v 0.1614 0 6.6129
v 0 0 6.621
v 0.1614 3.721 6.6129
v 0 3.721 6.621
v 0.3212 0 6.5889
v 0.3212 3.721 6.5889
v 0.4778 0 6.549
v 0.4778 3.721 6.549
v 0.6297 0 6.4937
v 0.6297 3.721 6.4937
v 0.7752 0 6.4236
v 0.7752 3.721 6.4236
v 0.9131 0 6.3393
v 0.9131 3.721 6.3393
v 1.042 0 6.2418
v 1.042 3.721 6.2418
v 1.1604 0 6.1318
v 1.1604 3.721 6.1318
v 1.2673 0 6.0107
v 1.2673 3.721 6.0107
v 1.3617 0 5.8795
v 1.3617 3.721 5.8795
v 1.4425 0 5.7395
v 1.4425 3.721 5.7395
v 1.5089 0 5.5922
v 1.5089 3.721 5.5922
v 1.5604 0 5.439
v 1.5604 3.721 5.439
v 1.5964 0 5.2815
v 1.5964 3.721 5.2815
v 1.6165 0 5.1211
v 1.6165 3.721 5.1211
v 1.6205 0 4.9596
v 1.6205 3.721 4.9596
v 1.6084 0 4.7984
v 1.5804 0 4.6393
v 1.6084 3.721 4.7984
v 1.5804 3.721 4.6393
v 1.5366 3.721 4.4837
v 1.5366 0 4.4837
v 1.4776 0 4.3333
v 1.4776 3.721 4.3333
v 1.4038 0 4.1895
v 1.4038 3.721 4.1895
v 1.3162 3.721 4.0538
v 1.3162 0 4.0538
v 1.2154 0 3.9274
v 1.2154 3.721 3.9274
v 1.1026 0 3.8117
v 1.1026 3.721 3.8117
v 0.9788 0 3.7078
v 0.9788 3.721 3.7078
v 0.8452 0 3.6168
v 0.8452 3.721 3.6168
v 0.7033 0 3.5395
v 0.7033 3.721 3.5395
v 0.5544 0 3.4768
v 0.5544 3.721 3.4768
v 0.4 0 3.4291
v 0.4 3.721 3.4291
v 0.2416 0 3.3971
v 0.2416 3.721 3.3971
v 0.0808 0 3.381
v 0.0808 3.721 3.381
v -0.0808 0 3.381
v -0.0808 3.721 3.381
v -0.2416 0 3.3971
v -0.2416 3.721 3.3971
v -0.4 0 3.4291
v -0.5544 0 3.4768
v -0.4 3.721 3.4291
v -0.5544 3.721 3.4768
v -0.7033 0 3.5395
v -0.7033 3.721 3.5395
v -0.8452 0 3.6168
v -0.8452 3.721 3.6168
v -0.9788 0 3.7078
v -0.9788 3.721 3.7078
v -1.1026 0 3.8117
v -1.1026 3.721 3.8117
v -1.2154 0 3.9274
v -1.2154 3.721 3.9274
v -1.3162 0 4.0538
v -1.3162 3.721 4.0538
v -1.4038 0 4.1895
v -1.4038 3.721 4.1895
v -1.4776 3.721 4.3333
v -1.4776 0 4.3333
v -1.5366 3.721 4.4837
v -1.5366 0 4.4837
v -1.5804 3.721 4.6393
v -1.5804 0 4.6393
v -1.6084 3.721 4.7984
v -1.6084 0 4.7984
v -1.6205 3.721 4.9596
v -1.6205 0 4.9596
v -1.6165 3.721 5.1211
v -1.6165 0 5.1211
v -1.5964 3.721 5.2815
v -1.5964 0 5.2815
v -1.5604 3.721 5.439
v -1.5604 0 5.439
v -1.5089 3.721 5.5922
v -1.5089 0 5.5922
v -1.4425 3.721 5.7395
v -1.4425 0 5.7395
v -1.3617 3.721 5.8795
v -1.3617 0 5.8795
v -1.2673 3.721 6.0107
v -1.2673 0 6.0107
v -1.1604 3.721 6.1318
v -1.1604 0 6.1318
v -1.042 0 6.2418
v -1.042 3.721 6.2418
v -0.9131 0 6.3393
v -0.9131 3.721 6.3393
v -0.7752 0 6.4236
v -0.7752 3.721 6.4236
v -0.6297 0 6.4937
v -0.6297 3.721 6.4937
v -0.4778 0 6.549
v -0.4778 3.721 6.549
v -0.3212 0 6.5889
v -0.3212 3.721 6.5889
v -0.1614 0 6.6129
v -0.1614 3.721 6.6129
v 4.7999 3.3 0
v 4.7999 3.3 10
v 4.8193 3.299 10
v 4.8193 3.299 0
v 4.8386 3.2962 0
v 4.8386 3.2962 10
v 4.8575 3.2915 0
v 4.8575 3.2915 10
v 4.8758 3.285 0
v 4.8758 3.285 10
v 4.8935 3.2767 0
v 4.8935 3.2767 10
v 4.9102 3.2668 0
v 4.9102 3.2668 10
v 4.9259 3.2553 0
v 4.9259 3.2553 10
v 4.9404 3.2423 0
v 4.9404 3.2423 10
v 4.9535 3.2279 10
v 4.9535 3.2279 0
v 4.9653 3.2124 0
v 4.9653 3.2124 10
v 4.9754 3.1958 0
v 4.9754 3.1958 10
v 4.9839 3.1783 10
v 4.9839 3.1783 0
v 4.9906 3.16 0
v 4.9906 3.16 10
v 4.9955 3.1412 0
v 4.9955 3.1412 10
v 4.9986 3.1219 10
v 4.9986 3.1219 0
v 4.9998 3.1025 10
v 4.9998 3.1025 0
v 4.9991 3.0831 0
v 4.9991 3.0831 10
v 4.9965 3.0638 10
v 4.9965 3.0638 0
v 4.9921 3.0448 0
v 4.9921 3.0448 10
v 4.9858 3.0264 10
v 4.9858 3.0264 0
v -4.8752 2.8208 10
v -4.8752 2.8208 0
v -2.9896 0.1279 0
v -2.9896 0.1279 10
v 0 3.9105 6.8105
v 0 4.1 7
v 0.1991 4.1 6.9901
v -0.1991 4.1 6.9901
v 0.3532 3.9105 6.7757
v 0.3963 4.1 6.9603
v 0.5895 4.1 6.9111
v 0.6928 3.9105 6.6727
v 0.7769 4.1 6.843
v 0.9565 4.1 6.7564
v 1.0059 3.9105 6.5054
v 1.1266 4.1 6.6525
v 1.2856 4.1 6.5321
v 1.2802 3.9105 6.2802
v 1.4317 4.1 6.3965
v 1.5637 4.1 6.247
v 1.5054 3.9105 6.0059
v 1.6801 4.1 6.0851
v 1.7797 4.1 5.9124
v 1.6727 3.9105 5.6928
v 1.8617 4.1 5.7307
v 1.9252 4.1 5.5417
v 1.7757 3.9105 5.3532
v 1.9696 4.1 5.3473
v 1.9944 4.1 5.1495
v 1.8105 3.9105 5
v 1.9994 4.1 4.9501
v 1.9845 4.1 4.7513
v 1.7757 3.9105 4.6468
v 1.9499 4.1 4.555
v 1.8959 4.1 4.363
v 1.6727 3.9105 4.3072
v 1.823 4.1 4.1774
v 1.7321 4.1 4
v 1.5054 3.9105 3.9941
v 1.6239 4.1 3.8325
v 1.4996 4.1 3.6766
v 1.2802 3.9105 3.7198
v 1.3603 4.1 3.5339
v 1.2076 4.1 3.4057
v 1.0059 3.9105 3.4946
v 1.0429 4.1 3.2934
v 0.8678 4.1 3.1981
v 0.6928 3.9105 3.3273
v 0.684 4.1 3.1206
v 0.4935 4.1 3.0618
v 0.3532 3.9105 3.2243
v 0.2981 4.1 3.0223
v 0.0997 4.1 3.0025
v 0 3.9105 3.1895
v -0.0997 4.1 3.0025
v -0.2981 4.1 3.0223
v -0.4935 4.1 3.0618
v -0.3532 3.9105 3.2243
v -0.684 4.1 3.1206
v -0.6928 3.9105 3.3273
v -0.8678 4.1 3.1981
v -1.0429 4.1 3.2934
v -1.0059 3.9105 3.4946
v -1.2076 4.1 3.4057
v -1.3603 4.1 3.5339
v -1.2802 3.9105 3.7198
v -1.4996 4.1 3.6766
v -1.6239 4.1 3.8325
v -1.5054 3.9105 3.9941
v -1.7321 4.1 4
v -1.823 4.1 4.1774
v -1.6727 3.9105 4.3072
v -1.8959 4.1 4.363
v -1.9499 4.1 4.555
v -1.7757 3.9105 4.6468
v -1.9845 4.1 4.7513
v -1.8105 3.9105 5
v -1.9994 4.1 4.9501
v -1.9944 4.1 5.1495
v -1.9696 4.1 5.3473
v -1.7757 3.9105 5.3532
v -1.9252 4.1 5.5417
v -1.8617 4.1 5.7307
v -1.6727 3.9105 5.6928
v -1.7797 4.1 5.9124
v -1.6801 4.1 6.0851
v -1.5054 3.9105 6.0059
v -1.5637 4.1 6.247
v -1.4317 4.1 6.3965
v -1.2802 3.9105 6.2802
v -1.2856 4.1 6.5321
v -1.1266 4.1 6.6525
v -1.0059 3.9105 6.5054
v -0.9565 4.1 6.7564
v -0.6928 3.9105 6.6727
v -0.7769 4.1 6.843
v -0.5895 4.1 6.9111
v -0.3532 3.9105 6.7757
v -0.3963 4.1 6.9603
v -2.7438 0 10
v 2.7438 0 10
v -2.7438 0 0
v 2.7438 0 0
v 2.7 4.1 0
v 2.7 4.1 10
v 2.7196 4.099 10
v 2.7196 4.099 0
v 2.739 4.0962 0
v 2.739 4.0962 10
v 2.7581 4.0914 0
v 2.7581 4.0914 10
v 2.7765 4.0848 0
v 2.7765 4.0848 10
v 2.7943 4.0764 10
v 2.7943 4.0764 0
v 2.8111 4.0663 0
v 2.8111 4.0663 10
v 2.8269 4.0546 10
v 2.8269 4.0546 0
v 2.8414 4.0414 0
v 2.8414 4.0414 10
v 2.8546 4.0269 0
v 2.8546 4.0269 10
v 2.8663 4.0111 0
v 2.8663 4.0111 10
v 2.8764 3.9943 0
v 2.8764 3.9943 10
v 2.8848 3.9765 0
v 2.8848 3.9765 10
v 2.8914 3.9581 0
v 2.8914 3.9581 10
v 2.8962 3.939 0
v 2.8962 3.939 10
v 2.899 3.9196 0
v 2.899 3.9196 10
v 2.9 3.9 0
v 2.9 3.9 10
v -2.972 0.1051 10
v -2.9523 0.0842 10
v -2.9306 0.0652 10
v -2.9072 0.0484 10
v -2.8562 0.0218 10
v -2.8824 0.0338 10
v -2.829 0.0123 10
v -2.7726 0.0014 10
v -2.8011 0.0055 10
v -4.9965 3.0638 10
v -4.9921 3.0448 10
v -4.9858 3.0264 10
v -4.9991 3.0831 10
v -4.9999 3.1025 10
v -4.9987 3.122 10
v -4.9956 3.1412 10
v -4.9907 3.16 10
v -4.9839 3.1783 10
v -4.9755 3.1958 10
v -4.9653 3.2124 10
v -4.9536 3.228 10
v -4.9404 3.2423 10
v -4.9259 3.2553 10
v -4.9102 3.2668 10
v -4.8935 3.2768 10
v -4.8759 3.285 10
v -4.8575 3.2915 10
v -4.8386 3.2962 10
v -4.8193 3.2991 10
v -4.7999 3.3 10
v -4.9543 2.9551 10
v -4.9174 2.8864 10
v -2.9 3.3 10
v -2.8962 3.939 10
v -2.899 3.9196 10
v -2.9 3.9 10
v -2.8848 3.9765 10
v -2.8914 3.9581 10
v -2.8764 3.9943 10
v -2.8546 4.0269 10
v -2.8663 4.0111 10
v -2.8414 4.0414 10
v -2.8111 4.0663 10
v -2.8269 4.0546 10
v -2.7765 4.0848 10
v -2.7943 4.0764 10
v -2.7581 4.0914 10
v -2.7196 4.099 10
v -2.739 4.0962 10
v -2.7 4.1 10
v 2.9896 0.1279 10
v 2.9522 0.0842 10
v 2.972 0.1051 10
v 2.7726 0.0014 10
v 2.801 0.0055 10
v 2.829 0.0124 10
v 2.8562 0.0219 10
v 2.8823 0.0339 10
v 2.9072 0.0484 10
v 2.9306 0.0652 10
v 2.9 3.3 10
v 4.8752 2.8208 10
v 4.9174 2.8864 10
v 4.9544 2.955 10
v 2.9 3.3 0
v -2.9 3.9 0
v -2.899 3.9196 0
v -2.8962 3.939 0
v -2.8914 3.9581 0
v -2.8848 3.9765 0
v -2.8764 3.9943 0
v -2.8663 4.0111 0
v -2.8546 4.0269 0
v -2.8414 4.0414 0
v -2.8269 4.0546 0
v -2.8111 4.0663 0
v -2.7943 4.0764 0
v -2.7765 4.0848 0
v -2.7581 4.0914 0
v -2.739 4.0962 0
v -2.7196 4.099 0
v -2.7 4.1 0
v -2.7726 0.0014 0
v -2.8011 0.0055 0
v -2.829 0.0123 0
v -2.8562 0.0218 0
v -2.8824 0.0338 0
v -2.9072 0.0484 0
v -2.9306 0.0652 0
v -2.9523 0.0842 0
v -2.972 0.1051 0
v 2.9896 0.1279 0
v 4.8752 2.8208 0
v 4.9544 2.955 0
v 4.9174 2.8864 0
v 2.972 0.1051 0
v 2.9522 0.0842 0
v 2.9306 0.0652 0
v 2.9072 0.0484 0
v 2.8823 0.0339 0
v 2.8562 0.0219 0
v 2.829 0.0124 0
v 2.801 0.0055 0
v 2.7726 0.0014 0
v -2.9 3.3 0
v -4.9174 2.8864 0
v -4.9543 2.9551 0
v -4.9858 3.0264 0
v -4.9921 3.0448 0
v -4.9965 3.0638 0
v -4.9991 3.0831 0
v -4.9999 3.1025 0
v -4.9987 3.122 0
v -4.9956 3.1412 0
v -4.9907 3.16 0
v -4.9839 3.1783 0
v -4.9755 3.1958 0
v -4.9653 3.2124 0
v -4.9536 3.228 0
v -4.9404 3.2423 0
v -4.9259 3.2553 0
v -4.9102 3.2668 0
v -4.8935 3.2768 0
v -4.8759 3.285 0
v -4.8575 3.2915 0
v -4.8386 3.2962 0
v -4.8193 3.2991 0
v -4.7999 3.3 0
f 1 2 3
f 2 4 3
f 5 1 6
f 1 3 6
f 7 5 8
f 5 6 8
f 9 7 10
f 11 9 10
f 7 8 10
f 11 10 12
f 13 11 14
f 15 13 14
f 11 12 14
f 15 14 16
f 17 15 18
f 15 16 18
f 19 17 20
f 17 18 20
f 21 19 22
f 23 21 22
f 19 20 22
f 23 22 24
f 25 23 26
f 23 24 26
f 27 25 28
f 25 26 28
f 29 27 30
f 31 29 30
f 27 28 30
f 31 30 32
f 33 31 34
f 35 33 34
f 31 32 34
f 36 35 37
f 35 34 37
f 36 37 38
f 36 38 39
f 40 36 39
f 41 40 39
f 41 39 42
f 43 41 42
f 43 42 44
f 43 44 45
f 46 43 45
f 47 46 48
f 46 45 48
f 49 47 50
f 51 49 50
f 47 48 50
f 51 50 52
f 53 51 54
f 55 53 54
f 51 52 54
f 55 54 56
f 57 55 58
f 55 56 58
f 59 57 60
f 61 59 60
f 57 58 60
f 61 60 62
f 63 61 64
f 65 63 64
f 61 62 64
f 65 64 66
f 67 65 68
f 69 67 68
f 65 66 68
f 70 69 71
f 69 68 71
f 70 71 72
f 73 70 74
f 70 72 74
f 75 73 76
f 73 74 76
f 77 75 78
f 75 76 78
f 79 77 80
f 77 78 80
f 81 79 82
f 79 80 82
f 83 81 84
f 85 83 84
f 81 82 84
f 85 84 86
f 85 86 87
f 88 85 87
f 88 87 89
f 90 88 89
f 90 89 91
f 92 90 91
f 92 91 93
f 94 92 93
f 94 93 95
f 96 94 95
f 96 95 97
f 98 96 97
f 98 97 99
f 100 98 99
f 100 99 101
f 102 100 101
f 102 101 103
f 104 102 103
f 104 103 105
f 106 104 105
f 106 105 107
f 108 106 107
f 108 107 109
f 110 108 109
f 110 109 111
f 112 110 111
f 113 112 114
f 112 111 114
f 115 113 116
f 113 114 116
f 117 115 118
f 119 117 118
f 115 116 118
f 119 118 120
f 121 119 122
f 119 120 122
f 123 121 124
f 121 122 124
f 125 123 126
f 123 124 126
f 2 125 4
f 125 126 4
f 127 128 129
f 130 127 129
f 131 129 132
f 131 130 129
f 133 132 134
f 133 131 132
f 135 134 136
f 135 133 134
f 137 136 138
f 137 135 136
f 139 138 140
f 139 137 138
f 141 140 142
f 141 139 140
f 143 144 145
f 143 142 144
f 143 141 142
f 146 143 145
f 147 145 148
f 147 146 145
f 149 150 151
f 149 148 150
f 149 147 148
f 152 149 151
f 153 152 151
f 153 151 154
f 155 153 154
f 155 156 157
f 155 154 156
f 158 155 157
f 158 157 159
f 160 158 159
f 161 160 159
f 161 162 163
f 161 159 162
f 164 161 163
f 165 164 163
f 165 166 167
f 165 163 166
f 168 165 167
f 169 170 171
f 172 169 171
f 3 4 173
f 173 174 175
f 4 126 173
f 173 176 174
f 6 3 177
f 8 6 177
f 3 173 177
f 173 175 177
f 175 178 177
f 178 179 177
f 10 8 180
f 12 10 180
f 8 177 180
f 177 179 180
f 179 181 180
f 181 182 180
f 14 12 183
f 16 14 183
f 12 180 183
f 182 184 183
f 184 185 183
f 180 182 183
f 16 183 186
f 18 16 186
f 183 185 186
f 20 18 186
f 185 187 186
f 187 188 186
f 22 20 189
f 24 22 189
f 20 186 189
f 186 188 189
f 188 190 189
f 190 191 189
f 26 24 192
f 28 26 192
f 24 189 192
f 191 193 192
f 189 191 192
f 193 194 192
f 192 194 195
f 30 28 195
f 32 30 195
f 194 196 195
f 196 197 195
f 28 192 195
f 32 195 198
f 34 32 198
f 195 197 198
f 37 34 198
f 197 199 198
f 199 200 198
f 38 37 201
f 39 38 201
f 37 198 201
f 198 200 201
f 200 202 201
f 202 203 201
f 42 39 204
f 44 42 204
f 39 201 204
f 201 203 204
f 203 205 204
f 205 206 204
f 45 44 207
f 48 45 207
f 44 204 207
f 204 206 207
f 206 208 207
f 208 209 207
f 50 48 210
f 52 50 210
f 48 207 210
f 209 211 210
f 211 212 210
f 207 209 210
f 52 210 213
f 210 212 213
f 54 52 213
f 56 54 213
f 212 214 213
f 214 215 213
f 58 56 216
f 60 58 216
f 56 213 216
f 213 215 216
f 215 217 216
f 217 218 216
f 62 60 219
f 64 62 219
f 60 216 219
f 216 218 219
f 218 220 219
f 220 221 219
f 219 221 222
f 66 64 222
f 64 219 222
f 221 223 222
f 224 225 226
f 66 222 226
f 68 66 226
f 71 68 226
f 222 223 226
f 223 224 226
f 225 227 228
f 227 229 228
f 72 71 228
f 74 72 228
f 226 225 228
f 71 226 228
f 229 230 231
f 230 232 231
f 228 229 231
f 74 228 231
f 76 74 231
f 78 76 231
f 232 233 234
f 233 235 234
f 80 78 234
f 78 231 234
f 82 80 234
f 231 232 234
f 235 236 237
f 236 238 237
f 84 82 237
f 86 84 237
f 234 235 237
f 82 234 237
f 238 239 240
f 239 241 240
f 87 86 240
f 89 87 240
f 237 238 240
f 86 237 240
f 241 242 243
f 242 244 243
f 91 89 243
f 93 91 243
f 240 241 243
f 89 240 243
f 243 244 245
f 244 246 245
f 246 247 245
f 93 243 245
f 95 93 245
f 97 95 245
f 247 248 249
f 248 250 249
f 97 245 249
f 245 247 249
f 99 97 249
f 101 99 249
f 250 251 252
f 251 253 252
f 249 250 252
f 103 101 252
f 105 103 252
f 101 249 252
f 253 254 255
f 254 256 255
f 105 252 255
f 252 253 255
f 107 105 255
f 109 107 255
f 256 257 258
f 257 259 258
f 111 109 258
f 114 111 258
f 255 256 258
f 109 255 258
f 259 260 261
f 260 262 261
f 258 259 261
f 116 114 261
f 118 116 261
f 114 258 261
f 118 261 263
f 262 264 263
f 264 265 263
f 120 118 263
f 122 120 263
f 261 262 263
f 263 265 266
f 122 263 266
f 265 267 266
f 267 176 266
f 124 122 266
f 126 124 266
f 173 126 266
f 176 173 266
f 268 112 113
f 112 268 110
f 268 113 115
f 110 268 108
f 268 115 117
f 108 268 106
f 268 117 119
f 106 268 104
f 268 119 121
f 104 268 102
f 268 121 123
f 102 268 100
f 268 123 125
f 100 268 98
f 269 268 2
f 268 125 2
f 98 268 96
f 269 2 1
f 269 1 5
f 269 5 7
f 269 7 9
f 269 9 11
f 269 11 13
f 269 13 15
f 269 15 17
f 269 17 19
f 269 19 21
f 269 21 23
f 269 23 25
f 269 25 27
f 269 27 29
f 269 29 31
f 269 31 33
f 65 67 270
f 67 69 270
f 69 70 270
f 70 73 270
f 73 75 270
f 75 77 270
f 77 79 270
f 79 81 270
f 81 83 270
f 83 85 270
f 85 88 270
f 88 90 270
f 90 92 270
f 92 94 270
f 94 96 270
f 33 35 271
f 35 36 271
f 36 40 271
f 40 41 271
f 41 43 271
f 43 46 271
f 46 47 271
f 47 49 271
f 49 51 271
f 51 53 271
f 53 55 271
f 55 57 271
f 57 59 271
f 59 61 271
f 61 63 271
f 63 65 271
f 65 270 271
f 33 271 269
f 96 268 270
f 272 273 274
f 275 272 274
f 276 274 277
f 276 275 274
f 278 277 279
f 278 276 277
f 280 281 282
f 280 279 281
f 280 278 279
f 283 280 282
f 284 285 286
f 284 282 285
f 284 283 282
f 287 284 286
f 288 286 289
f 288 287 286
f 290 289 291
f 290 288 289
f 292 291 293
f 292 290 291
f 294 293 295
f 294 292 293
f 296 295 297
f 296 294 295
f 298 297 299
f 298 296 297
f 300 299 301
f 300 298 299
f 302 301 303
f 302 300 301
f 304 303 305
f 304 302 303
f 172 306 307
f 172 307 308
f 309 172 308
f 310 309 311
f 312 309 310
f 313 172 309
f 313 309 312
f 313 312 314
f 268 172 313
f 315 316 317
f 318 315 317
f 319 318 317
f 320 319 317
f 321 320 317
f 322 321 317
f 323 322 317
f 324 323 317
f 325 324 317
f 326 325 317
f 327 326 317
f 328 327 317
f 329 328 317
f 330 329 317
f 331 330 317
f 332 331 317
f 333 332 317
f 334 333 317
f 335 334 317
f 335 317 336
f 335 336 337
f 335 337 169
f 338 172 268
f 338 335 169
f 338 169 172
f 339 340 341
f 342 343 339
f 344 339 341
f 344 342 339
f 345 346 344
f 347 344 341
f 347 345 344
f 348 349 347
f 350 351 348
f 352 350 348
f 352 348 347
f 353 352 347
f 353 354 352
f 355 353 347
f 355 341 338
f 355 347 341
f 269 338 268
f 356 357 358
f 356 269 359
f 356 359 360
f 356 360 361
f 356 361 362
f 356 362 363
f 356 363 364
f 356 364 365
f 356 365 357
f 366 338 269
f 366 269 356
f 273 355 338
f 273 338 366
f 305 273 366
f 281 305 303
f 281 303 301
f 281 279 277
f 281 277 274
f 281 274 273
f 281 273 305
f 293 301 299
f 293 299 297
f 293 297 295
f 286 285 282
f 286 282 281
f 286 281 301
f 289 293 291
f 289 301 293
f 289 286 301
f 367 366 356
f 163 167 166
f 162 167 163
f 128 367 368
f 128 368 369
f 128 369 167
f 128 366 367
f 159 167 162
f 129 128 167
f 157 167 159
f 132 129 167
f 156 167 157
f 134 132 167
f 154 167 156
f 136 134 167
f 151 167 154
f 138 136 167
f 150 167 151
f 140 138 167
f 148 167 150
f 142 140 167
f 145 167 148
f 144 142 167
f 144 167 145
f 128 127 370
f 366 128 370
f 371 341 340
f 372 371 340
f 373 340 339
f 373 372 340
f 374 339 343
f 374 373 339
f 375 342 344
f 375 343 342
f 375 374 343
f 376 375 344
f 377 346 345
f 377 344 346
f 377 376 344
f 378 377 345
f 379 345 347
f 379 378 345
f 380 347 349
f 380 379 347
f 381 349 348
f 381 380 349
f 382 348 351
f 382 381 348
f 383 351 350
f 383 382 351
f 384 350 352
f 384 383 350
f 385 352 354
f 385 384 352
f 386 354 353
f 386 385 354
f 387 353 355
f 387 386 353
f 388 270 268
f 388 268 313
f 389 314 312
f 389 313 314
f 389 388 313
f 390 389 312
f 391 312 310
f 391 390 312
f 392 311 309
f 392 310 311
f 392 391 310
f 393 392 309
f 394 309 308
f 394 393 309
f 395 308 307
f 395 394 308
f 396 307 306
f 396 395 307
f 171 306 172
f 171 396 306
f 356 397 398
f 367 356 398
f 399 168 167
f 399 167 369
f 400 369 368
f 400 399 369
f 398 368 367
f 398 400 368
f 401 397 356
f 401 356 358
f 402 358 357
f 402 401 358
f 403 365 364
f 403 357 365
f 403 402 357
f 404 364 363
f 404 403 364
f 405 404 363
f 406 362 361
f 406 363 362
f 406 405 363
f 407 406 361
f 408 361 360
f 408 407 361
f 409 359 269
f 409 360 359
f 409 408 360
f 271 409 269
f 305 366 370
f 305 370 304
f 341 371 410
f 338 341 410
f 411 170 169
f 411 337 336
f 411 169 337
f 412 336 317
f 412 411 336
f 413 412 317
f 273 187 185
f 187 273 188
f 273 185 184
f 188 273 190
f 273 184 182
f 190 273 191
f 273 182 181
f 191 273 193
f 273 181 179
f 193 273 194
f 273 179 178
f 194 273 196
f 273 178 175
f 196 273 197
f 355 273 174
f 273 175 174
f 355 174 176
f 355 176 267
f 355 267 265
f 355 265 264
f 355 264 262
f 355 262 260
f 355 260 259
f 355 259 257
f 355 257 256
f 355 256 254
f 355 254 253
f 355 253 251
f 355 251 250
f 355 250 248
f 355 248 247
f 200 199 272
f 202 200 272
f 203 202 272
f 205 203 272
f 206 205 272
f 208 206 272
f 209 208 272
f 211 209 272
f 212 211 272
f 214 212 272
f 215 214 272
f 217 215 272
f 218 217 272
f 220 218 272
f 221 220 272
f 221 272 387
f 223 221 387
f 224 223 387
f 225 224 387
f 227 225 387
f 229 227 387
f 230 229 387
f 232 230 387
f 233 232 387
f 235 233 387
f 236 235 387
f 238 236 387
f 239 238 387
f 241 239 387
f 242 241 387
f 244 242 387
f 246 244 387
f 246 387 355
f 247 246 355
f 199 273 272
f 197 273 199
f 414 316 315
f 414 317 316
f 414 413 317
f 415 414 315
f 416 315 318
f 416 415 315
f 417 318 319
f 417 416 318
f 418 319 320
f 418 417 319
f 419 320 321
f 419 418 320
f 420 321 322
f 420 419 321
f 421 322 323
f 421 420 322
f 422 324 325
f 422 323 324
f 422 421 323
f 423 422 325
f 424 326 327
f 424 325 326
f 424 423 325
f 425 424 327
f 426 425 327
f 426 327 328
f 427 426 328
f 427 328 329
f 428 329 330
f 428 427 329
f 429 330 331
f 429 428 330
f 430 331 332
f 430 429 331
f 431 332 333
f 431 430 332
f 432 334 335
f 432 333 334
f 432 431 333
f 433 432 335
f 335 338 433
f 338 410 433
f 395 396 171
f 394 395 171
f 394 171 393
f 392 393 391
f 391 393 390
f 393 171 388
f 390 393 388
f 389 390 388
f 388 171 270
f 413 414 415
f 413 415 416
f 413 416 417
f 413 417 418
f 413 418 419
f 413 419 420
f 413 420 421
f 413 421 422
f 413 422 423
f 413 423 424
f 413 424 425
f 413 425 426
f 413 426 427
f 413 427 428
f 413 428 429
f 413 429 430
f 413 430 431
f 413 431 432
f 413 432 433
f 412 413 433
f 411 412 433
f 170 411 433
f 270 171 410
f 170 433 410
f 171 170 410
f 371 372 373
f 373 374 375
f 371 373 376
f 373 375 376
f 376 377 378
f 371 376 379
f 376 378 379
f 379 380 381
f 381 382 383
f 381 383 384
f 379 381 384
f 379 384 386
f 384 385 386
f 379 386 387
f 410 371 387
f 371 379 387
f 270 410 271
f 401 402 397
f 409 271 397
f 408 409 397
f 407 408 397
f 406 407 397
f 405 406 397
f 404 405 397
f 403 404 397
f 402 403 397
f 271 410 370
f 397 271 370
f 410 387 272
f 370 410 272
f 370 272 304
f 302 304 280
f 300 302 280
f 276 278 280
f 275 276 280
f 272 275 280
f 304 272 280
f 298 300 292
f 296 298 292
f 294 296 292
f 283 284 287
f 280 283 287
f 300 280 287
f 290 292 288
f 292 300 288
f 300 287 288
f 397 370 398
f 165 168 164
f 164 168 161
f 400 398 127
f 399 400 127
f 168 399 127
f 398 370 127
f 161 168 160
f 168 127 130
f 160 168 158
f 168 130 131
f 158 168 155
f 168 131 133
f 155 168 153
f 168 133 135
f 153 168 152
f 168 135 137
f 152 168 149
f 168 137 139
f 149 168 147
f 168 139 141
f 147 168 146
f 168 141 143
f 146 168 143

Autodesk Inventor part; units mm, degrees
ref_plane "YZ Plane" through (0, 0, 0) normal (1, 0, 0) x (0, 1, 0)
ref_plane "XZ Plane" through (0, 0, 0) normal (0, 1, 0) x (-1, 0, 0)
ref_plane "XY Plane" through (0, 0, 0) normal (0, 0, 1) x (1, 0, 0)
sketch "Sketch_1" plane through (0, 0, 0) normal (0, 0, 1) x (1, 0, 0)
  arc A0 (-4.7999, 3.3) -> (-4.9858, 3.0264) centre (-4.7999, 3.1) ccw
  arc A1 (-4.9858, 3.0264) -> (-4.8752, 2.8208) centre (-4.056, 3.3944) ccw
  line L0 (-4.8752, 2.8208) -> (-2.9896, 0.1279)
  arc A2 (-2.9896, 0.1279) -> (-2.7438, 0) centre (-2.7438, 0.3) ccw
  line L1 (-2.7438, 0) -> (2.7438, 0)
  arc A3 (2.7438, 0) -> (2.9896, 0.1279) centre (2.7438, 0.3) ccw
  line L2 (2.9896, 0.1279) -> (4.8752, 2.8208)
  arc A4 (4.8752, 2.8208) -> (4.9858, 3.0264) centre (4.056, 3.3944) ccw
  arc A5 (4.9858, 3.0264) -> (4.7999, 3.3) centre (4.7999, 3.1) ccw
  line L3 (4.7999, 3.3) -> (2.9, 3.3)
  line L4 (2.9, 3.3) -> (2.9, 3.9)
  arc A6 (2.9, 3.9) -> (2.7, 4.1) centre (2.7, 3.9) ccw
  line L5 (2.7, 4.1) -> (-2.7, 4.1)
  arc A7 (-2.7, 4.1) -> (-2.9, 3.9) centre (-2.7, 3.9) ccw
  line L6 (-2.9, 3.9) -> (-2.9, 3.3)
  line L7 (-2.9, 3.3) -> (-4.7999, 3.3)
extrude "Extrusion1" add sketch "Sketch_1" along normal blind 10
sketch "Sketch_2" plane through (0, 0, 0) normal (1, 0, 0) x (0, 0, -1)
  line L0 (-5, 4.1) -> (-5, 0)
  line L1 (-5, 0) -> (-6.621, 0)
  line L2 (-6.621, 0) -> (-6.621, 3.721)
  line L3 (-6.621, 3.721) -> (-7, 4.1)
  line L4 (-7, 4.1) -> (-5, 4.1)
  line L5 (-5, 4.1) -> (-5, 0)
revolve "Revolution1" cut sketch "Sketch_2" angle 360 about axis through (0, 4.1, 5) along (0, 1, 0)
thread "Thread1" size "M4x0.7" class "6H" standard "ISO Metric profile" full length
properties part number "PACK-HNTT5-4"
